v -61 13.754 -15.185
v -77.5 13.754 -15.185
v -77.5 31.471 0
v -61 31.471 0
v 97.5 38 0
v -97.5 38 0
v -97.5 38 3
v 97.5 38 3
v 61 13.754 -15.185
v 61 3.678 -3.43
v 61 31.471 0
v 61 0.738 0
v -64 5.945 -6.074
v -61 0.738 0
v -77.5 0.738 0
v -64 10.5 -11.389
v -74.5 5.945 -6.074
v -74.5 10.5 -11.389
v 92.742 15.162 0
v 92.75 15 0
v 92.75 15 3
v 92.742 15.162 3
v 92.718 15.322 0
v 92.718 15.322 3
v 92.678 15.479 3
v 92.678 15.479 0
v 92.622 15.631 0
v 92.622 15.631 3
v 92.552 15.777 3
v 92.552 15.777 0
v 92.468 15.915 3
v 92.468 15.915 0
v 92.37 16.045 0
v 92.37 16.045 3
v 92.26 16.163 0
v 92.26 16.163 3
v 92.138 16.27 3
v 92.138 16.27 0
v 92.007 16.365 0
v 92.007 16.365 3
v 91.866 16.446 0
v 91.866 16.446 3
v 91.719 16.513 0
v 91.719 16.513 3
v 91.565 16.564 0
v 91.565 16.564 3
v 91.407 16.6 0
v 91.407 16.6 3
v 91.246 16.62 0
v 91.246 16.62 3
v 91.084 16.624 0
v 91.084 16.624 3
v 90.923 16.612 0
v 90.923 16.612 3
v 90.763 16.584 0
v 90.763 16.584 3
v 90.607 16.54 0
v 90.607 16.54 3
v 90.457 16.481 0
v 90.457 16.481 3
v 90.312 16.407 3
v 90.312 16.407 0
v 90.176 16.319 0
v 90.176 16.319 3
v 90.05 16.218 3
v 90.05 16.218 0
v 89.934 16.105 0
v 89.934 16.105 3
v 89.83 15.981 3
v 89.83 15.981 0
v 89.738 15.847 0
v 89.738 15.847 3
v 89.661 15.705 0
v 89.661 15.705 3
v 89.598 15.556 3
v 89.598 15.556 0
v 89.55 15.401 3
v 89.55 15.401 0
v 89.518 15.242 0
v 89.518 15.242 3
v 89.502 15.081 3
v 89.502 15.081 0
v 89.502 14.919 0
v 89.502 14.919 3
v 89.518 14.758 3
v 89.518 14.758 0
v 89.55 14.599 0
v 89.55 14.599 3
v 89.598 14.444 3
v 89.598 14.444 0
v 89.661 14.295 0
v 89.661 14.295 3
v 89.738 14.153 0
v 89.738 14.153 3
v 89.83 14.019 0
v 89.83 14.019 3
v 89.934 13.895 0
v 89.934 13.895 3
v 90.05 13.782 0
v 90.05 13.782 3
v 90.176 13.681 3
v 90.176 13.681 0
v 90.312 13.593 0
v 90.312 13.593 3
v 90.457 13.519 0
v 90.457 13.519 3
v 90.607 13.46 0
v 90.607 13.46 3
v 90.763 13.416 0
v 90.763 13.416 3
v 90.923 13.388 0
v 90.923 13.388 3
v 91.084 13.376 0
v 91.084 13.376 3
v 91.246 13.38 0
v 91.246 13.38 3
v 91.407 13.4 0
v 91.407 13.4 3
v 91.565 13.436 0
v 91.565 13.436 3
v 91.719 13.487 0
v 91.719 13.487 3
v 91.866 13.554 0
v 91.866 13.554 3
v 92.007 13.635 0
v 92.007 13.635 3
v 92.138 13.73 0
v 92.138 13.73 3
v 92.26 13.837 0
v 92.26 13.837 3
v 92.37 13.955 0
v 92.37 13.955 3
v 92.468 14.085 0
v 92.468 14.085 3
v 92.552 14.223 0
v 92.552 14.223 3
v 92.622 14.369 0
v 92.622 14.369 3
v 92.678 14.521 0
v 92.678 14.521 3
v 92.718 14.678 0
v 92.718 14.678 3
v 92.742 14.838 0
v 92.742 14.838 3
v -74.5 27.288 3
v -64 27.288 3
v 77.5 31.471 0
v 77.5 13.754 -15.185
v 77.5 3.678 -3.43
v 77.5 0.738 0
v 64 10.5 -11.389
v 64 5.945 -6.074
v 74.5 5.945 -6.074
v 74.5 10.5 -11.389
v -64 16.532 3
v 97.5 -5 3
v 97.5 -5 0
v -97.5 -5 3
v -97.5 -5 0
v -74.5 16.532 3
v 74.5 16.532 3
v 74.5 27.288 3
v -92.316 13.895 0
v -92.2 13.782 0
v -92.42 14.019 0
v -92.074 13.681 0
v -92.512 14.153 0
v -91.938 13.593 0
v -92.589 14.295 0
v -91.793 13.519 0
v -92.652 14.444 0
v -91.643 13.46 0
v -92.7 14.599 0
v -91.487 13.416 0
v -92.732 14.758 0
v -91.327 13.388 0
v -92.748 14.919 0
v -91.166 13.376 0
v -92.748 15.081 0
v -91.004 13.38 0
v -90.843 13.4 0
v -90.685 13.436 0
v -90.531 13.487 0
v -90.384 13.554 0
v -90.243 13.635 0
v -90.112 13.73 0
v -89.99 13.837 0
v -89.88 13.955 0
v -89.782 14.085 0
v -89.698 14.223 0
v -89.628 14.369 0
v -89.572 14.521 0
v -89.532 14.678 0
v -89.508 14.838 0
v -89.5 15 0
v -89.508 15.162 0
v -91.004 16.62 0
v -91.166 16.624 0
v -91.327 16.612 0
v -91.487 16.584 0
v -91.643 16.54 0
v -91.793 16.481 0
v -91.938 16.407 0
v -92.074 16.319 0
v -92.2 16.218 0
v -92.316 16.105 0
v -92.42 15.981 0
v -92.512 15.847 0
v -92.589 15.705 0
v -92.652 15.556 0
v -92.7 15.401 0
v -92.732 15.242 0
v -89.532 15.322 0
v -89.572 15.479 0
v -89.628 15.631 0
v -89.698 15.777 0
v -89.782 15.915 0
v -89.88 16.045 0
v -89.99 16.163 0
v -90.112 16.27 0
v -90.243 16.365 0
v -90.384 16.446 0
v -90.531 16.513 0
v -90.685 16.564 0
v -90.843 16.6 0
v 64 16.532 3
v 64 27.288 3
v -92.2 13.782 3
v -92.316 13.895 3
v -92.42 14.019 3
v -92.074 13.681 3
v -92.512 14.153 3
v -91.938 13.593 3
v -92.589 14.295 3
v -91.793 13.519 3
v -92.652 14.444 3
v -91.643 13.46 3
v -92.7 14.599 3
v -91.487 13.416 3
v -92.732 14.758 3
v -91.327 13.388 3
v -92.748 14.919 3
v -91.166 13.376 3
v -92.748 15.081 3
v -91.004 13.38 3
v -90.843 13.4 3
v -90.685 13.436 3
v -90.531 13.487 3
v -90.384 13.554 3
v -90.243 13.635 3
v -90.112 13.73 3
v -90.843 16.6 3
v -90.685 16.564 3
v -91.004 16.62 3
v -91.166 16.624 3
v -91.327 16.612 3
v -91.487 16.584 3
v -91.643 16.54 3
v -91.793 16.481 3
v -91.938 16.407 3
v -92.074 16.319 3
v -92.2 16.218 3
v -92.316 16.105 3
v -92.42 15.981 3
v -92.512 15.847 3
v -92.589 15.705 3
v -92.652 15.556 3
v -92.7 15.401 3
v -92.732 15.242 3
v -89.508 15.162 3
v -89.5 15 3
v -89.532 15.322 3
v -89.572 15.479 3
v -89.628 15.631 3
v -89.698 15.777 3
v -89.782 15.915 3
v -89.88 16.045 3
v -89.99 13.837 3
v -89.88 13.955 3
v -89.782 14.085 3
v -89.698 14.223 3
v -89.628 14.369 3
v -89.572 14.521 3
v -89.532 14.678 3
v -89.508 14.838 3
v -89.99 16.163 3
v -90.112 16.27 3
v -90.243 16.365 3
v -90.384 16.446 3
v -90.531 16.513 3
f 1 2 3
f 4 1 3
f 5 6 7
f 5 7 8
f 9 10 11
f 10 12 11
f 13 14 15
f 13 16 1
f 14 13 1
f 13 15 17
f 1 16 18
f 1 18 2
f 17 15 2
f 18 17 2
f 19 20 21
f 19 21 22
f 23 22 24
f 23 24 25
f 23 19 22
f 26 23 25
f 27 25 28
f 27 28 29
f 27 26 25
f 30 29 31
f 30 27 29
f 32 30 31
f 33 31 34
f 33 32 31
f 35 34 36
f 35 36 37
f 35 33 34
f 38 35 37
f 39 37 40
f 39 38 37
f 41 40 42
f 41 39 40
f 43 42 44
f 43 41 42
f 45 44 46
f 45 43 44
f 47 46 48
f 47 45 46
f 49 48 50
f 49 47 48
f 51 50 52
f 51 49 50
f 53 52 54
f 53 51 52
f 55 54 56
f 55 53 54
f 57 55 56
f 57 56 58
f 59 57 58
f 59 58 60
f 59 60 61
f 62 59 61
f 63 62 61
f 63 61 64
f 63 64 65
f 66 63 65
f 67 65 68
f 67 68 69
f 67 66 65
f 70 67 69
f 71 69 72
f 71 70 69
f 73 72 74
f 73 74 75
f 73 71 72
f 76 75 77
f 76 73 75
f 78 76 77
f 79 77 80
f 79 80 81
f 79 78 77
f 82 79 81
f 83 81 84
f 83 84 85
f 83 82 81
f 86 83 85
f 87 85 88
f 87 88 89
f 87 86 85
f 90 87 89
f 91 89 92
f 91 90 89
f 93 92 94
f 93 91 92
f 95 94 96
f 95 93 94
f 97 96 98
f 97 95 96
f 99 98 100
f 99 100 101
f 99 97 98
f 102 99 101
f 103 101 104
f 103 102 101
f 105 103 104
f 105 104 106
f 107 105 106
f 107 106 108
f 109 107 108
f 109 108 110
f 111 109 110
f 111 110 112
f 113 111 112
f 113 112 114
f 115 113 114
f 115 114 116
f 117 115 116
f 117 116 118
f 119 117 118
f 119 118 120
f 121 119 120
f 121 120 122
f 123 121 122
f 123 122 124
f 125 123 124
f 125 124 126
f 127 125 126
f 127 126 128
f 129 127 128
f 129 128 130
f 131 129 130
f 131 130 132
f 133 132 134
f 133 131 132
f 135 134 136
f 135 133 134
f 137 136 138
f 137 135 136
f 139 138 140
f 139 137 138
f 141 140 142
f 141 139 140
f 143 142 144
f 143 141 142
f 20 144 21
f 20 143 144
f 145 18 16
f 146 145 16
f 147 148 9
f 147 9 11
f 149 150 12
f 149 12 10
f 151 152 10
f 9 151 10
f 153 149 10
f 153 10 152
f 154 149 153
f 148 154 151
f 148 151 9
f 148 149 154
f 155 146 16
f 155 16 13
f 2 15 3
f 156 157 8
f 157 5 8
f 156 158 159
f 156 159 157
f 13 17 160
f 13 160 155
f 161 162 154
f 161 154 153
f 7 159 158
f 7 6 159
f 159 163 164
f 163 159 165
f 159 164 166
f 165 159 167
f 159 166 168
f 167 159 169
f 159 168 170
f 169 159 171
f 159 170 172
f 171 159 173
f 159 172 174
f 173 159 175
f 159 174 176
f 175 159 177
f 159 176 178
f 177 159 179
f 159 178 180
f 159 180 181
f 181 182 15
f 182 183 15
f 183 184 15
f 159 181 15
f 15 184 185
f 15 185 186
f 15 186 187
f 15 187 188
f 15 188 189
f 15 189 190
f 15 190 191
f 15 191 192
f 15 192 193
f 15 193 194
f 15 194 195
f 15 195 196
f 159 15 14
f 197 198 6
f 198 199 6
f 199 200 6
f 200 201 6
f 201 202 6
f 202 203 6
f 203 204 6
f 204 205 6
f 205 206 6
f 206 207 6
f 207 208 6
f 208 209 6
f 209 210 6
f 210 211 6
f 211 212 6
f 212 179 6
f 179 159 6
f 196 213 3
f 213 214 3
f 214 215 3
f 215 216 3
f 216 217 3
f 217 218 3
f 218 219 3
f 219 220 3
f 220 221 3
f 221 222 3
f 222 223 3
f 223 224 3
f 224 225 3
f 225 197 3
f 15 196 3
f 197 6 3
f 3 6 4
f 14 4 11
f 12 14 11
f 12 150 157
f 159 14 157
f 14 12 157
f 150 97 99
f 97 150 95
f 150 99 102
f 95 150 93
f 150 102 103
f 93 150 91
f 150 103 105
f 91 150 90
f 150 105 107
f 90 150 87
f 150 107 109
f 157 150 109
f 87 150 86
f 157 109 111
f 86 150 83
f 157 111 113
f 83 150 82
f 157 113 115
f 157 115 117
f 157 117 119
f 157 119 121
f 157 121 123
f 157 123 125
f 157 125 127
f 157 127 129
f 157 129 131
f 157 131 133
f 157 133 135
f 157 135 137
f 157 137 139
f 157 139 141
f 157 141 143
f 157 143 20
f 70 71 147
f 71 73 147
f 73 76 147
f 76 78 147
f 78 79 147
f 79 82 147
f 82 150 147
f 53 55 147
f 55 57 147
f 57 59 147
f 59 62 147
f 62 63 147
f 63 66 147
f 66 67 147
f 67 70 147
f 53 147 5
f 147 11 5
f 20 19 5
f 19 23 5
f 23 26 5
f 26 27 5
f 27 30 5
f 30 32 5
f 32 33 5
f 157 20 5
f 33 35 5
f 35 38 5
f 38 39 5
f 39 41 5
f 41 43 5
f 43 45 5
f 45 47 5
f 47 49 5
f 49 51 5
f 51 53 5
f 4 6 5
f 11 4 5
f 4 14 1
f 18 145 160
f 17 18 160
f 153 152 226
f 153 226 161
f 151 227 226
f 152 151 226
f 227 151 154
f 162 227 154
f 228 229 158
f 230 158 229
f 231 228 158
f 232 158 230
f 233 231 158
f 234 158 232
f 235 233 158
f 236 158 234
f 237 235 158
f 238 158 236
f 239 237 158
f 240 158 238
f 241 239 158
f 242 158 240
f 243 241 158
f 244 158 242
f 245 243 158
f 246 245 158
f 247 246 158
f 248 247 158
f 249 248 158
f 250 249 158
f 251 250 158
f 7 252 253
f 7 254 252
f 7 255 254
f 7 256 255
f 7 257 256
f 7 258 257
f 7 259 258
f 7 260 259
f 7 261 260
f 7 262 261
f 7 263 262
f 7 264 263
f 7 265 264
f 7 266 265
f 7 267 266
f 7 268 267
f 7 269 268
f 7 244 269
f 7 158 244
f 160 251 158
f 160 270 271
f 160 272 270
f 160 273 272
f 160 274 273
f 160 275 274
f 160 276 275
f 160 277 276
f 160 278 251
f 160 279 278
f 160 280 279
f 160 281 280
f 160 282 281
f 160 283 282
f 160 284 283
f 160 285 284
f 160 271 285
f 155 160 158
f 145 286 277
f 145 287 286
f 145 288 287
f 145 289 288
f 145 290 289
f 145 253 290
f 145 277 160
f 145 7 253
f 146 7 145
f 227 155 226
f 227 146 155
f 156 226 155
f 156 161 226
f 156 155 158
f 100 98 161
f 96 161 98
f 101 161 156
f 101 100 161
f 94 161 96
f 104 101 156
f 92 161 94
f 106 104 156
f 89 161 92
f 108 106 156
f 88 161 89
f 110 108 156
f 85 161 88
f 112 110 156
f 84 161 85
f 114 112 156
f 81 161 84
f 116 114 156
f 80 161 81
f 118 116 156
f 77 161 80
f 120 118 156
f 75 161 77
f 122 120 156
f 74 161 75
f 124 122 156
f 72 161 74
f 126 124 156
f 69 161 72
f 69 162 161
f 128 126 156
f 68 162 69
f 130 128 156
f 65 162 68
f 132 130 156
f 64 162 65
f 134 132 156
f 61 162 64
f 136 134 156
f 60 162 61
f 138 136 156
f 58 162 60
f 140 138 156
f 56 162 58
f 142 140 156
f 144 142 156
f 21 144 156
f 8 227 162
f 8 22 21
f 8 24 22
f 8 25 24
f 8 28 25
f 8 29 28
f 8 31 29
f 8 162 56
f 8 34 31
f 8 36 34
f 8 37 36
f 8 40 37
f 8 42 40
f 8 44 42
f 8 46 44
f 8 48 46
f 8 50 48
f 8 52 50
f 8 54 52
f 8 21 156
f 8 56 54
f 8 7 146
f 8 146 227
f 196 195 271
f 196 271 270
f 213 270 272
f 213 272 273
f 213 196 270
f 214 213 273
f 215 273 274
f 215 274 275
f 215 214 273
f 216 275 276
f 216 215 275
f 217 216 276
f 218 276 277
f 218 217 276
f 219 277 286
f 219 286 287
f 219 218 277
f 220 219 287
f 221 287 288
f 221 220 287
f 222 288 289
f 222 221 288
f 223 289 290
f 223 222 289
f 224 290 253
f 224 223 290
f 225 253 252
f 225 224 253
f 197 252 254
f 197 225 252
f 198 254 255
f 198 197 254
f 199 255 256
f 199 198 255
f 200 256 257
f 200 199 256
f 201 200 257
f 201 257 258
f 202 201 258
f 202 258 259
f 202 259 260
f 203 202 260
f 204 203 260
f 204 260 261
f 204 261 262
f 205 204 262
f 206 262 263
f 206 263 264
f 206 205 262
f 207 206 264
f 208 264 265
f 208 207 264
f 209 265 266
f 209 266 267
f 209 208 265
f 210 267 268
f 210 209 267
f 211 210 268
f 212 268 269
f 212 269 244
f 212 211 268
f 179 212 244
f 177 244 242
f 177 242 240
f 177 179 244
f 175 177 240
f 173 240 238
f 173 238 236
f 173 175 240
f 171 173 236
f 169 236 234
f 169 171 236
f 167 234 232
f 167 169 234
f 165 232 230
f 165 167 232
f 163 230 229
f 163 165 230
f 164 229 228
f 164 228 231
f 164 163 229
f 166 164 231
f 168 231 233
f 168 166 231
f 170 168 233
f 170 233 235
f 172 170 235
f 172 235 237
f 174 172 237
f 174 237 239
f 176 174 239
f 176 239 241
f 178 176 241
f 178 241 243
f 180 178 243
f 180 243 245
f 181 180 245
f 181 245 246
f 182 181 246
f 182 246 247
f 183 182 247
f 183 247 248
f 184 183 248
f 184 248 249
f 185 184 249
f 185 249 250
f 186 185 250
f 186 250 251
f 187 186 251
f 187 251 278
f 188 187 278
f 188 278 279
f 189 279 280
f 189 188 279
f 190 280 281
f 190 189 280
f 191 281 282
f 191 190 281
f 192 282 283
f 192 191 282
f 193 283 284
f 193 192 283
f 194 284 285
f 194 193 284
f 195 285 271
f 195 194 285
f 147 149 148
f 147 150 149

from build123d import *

# Parameters (mm, degrees)
CROQUIS1_W              = 195
CROQUIS1_H              = 38
CROQUIS1_R              = 1.625
SALIENTE_EXTRUIR1_DEPTH = 3
SALIENTE_EXTRUIR2_START = -20
SALIENTE_EXTRUIR2_DEPTH = 16.5
CROQUIS3_W              = 10.5
CROQUIS3_H              = 7
CORTAR_EXTRUIR1_DEPTH   = 31.243984
SALIENTE_EXTRUIR3_START = -20
SALIENTE_EXTRUIR3_DEPTH = 16.5
CROQUIS5_W              = 10.5
CROQUIS5_H              = 7
CORTAR_EXTRUIR2_DEPTH   = 31.243984
SALIENTE_EXTRUIR4_START = -120
SALIENTE_EXTRUIR4_DEPTH = 45
CROQUIS7_R              = 8.25
CORTAR_EXTRUIR3_DEPTH   = 31.243984
CROQUIS8_W              = 195
CROQUIS8_H              = 3
SALIENTE_EXTRUIR5_DEPTH = 5
CORTAR_EXTRUIR4_REACH   = 122
CROQUIS10_W             = 55.675323807
CROQUIS10_H             = 32.604384831
SALIENTE_EXTRUIR7_DEPTH = 3


with BuildPart() as part:
    # Croquis1 → Saliente-Extruir1 (new body)
    with BuildSketch(Plane.XY):
        with Locations((0, 19)):
            Rectangle(CROQUIS1_W, CROQUIS1_H)
        with Locations((91.125, 15)):
            Circle(CROQUIS1_R, mode=Mode.SUBTRACT)
        with Locations((-91.125, 15)):
            Circle(CROQUIS1_R, mode=Mode.SUBTRACT)
    extrude(amount=SALIENTE_EXTRUIR1_DEPTH)

    # Croquis2 → Saliente-Extruir2 (add)
    with BuildSketch(Plane(origin=(97.5, 0, 0), x_dir=(0, 0, -1), z_dir=(1, 0, 0)).offset(SALIENTE_EXTRUIR2_START)):
        Polygon((3.429565646, 3.677896428), (15.185426147, 13.753887502), (0, 31.471028189), (0, 0.738403157), align=None)
    extrude(amount=-SALIENTE_EXTRUIR2_DEPTH)

    # Croquis3 → Cortar-Extruir1 (cut, through all)
    with BuildSketch(Plane(origin=(0, 0.425684191, 0.364855478), x_dir=(1, 0, 0), z_dir=(0, -0.759271307, -0.650774217))):
        with Locations((69.25, -11.980533736)):
            Rectangle(CROQUIS3_W, CROQUIS3_H)
    extrude(amount=-CORTAR_EXTRUIR1_DEPTH, mode=Mode.SUBTRACT)

    # Croquis4 → Saliente-Extruir3 (add)
    with BuildSketch(Plane.ZY.offset(97.5).offset(SALIENTE_EXTRUIR3_START)):
        Polygon((0, 0.738403157), (-15.185426147, 13.753887502), (0, 31.471028189), align=None)
    extrude(amount=-SALIENTE_EXTRUIR3_DEPTH)

    # Croquis5 → Cortar-Extruir2 (cut, through all)
    with BuildSketch(Plane(origin=(0, 0.425684191, 0.364855478), x_dir=(1, 0, 0), z_dir=(0, -0.759271307, -0.650774217))):
        with Locations((-69.25, -11.980533736)):
            Rectangle(CROQUIS5_W, CROQUIS5_H)
    extrude(amount=-CORTAR_EXTRUIR2_DEPTH, mode=Mode.SUBTRACT)

    # Croquis6 → Saliente-Extruir4 (add)
    with BuildSketch(Plane(origin=(97.5, 0, 0), x_dir=(0, 0, -1), z_dir=(1, 0, 0)).offset(SALIENTE_EXTRUIR4_START)):
        Polygon((0, 0.738403157), (15.185426147, 13.753887502), (0, 31.471028189), align=None)
    extrude(amount=SALIENTE_EXTRUIR4_DEPTH)

    # Croquis7 → Cortar-Extruir3 (cut, through all)
    with BuildSketch(Plane(origin=(0, 0.425684191, 0.364855478), x_dir=(1, 0, 0), z_dir=(0, -0.759271307, -0.650774217))):
        with Locations((-12.92, -10.480533736)):
            Circle(CROQUIS7_R)
        with Locations((12.93, -10.480533736)):
            Circle(CROQUIS7_R)
    extrude(amount=-CORTAR_EXTRUIR3_DEPTH, mode=Mode.SUBTRACT)

    # Croquis8 → Saliente-Extruir5 (add)
    with BuildSketch(Plane.XZ):
        with Locations((0, 1.5)):
            Rectangle(CROQUIS8_W, CROQUIS8_H)
    extrude(amount=SALIENTE_EXTRUIR5_DEPTH)

    # Croquis9 → Cortar-Extruir4 (cut, up to next)
    with BuildSketch(Plane.ZY.offset(22.5), mode=Mode.PRIVATE) as cortar_extruir4_sk1:
        Polygon((0, 0.738403157), (-15.185426147, 13.753887502), (0, 31.471028189), align=None)
    cortar_extruir4_tool1 = extrude(cortar_extruir4_sk1.sketch, amount=-CORTAR_EXTRUIR4_REACH, mode=Mode.PRIVATE) & part.part
    add(cortar_extruir4_tool1.solids().sort_by_distance((-22.5, 15.321106, -5.061809))[0], mode=Mode.SUBTRACT)

    # Croquis10 → Saliente-Extruir7 (add)
    with BuildSketch(Plane.XY.offset(3)):
        with Locations((-1.24159067, 18.458583135)):
            Rectangle(CROQUIS10_W, CROQUIS10_H)
    extrude(amount=-SALIENTE_EXTRUIR7_DEPTH)


solid = part.part
